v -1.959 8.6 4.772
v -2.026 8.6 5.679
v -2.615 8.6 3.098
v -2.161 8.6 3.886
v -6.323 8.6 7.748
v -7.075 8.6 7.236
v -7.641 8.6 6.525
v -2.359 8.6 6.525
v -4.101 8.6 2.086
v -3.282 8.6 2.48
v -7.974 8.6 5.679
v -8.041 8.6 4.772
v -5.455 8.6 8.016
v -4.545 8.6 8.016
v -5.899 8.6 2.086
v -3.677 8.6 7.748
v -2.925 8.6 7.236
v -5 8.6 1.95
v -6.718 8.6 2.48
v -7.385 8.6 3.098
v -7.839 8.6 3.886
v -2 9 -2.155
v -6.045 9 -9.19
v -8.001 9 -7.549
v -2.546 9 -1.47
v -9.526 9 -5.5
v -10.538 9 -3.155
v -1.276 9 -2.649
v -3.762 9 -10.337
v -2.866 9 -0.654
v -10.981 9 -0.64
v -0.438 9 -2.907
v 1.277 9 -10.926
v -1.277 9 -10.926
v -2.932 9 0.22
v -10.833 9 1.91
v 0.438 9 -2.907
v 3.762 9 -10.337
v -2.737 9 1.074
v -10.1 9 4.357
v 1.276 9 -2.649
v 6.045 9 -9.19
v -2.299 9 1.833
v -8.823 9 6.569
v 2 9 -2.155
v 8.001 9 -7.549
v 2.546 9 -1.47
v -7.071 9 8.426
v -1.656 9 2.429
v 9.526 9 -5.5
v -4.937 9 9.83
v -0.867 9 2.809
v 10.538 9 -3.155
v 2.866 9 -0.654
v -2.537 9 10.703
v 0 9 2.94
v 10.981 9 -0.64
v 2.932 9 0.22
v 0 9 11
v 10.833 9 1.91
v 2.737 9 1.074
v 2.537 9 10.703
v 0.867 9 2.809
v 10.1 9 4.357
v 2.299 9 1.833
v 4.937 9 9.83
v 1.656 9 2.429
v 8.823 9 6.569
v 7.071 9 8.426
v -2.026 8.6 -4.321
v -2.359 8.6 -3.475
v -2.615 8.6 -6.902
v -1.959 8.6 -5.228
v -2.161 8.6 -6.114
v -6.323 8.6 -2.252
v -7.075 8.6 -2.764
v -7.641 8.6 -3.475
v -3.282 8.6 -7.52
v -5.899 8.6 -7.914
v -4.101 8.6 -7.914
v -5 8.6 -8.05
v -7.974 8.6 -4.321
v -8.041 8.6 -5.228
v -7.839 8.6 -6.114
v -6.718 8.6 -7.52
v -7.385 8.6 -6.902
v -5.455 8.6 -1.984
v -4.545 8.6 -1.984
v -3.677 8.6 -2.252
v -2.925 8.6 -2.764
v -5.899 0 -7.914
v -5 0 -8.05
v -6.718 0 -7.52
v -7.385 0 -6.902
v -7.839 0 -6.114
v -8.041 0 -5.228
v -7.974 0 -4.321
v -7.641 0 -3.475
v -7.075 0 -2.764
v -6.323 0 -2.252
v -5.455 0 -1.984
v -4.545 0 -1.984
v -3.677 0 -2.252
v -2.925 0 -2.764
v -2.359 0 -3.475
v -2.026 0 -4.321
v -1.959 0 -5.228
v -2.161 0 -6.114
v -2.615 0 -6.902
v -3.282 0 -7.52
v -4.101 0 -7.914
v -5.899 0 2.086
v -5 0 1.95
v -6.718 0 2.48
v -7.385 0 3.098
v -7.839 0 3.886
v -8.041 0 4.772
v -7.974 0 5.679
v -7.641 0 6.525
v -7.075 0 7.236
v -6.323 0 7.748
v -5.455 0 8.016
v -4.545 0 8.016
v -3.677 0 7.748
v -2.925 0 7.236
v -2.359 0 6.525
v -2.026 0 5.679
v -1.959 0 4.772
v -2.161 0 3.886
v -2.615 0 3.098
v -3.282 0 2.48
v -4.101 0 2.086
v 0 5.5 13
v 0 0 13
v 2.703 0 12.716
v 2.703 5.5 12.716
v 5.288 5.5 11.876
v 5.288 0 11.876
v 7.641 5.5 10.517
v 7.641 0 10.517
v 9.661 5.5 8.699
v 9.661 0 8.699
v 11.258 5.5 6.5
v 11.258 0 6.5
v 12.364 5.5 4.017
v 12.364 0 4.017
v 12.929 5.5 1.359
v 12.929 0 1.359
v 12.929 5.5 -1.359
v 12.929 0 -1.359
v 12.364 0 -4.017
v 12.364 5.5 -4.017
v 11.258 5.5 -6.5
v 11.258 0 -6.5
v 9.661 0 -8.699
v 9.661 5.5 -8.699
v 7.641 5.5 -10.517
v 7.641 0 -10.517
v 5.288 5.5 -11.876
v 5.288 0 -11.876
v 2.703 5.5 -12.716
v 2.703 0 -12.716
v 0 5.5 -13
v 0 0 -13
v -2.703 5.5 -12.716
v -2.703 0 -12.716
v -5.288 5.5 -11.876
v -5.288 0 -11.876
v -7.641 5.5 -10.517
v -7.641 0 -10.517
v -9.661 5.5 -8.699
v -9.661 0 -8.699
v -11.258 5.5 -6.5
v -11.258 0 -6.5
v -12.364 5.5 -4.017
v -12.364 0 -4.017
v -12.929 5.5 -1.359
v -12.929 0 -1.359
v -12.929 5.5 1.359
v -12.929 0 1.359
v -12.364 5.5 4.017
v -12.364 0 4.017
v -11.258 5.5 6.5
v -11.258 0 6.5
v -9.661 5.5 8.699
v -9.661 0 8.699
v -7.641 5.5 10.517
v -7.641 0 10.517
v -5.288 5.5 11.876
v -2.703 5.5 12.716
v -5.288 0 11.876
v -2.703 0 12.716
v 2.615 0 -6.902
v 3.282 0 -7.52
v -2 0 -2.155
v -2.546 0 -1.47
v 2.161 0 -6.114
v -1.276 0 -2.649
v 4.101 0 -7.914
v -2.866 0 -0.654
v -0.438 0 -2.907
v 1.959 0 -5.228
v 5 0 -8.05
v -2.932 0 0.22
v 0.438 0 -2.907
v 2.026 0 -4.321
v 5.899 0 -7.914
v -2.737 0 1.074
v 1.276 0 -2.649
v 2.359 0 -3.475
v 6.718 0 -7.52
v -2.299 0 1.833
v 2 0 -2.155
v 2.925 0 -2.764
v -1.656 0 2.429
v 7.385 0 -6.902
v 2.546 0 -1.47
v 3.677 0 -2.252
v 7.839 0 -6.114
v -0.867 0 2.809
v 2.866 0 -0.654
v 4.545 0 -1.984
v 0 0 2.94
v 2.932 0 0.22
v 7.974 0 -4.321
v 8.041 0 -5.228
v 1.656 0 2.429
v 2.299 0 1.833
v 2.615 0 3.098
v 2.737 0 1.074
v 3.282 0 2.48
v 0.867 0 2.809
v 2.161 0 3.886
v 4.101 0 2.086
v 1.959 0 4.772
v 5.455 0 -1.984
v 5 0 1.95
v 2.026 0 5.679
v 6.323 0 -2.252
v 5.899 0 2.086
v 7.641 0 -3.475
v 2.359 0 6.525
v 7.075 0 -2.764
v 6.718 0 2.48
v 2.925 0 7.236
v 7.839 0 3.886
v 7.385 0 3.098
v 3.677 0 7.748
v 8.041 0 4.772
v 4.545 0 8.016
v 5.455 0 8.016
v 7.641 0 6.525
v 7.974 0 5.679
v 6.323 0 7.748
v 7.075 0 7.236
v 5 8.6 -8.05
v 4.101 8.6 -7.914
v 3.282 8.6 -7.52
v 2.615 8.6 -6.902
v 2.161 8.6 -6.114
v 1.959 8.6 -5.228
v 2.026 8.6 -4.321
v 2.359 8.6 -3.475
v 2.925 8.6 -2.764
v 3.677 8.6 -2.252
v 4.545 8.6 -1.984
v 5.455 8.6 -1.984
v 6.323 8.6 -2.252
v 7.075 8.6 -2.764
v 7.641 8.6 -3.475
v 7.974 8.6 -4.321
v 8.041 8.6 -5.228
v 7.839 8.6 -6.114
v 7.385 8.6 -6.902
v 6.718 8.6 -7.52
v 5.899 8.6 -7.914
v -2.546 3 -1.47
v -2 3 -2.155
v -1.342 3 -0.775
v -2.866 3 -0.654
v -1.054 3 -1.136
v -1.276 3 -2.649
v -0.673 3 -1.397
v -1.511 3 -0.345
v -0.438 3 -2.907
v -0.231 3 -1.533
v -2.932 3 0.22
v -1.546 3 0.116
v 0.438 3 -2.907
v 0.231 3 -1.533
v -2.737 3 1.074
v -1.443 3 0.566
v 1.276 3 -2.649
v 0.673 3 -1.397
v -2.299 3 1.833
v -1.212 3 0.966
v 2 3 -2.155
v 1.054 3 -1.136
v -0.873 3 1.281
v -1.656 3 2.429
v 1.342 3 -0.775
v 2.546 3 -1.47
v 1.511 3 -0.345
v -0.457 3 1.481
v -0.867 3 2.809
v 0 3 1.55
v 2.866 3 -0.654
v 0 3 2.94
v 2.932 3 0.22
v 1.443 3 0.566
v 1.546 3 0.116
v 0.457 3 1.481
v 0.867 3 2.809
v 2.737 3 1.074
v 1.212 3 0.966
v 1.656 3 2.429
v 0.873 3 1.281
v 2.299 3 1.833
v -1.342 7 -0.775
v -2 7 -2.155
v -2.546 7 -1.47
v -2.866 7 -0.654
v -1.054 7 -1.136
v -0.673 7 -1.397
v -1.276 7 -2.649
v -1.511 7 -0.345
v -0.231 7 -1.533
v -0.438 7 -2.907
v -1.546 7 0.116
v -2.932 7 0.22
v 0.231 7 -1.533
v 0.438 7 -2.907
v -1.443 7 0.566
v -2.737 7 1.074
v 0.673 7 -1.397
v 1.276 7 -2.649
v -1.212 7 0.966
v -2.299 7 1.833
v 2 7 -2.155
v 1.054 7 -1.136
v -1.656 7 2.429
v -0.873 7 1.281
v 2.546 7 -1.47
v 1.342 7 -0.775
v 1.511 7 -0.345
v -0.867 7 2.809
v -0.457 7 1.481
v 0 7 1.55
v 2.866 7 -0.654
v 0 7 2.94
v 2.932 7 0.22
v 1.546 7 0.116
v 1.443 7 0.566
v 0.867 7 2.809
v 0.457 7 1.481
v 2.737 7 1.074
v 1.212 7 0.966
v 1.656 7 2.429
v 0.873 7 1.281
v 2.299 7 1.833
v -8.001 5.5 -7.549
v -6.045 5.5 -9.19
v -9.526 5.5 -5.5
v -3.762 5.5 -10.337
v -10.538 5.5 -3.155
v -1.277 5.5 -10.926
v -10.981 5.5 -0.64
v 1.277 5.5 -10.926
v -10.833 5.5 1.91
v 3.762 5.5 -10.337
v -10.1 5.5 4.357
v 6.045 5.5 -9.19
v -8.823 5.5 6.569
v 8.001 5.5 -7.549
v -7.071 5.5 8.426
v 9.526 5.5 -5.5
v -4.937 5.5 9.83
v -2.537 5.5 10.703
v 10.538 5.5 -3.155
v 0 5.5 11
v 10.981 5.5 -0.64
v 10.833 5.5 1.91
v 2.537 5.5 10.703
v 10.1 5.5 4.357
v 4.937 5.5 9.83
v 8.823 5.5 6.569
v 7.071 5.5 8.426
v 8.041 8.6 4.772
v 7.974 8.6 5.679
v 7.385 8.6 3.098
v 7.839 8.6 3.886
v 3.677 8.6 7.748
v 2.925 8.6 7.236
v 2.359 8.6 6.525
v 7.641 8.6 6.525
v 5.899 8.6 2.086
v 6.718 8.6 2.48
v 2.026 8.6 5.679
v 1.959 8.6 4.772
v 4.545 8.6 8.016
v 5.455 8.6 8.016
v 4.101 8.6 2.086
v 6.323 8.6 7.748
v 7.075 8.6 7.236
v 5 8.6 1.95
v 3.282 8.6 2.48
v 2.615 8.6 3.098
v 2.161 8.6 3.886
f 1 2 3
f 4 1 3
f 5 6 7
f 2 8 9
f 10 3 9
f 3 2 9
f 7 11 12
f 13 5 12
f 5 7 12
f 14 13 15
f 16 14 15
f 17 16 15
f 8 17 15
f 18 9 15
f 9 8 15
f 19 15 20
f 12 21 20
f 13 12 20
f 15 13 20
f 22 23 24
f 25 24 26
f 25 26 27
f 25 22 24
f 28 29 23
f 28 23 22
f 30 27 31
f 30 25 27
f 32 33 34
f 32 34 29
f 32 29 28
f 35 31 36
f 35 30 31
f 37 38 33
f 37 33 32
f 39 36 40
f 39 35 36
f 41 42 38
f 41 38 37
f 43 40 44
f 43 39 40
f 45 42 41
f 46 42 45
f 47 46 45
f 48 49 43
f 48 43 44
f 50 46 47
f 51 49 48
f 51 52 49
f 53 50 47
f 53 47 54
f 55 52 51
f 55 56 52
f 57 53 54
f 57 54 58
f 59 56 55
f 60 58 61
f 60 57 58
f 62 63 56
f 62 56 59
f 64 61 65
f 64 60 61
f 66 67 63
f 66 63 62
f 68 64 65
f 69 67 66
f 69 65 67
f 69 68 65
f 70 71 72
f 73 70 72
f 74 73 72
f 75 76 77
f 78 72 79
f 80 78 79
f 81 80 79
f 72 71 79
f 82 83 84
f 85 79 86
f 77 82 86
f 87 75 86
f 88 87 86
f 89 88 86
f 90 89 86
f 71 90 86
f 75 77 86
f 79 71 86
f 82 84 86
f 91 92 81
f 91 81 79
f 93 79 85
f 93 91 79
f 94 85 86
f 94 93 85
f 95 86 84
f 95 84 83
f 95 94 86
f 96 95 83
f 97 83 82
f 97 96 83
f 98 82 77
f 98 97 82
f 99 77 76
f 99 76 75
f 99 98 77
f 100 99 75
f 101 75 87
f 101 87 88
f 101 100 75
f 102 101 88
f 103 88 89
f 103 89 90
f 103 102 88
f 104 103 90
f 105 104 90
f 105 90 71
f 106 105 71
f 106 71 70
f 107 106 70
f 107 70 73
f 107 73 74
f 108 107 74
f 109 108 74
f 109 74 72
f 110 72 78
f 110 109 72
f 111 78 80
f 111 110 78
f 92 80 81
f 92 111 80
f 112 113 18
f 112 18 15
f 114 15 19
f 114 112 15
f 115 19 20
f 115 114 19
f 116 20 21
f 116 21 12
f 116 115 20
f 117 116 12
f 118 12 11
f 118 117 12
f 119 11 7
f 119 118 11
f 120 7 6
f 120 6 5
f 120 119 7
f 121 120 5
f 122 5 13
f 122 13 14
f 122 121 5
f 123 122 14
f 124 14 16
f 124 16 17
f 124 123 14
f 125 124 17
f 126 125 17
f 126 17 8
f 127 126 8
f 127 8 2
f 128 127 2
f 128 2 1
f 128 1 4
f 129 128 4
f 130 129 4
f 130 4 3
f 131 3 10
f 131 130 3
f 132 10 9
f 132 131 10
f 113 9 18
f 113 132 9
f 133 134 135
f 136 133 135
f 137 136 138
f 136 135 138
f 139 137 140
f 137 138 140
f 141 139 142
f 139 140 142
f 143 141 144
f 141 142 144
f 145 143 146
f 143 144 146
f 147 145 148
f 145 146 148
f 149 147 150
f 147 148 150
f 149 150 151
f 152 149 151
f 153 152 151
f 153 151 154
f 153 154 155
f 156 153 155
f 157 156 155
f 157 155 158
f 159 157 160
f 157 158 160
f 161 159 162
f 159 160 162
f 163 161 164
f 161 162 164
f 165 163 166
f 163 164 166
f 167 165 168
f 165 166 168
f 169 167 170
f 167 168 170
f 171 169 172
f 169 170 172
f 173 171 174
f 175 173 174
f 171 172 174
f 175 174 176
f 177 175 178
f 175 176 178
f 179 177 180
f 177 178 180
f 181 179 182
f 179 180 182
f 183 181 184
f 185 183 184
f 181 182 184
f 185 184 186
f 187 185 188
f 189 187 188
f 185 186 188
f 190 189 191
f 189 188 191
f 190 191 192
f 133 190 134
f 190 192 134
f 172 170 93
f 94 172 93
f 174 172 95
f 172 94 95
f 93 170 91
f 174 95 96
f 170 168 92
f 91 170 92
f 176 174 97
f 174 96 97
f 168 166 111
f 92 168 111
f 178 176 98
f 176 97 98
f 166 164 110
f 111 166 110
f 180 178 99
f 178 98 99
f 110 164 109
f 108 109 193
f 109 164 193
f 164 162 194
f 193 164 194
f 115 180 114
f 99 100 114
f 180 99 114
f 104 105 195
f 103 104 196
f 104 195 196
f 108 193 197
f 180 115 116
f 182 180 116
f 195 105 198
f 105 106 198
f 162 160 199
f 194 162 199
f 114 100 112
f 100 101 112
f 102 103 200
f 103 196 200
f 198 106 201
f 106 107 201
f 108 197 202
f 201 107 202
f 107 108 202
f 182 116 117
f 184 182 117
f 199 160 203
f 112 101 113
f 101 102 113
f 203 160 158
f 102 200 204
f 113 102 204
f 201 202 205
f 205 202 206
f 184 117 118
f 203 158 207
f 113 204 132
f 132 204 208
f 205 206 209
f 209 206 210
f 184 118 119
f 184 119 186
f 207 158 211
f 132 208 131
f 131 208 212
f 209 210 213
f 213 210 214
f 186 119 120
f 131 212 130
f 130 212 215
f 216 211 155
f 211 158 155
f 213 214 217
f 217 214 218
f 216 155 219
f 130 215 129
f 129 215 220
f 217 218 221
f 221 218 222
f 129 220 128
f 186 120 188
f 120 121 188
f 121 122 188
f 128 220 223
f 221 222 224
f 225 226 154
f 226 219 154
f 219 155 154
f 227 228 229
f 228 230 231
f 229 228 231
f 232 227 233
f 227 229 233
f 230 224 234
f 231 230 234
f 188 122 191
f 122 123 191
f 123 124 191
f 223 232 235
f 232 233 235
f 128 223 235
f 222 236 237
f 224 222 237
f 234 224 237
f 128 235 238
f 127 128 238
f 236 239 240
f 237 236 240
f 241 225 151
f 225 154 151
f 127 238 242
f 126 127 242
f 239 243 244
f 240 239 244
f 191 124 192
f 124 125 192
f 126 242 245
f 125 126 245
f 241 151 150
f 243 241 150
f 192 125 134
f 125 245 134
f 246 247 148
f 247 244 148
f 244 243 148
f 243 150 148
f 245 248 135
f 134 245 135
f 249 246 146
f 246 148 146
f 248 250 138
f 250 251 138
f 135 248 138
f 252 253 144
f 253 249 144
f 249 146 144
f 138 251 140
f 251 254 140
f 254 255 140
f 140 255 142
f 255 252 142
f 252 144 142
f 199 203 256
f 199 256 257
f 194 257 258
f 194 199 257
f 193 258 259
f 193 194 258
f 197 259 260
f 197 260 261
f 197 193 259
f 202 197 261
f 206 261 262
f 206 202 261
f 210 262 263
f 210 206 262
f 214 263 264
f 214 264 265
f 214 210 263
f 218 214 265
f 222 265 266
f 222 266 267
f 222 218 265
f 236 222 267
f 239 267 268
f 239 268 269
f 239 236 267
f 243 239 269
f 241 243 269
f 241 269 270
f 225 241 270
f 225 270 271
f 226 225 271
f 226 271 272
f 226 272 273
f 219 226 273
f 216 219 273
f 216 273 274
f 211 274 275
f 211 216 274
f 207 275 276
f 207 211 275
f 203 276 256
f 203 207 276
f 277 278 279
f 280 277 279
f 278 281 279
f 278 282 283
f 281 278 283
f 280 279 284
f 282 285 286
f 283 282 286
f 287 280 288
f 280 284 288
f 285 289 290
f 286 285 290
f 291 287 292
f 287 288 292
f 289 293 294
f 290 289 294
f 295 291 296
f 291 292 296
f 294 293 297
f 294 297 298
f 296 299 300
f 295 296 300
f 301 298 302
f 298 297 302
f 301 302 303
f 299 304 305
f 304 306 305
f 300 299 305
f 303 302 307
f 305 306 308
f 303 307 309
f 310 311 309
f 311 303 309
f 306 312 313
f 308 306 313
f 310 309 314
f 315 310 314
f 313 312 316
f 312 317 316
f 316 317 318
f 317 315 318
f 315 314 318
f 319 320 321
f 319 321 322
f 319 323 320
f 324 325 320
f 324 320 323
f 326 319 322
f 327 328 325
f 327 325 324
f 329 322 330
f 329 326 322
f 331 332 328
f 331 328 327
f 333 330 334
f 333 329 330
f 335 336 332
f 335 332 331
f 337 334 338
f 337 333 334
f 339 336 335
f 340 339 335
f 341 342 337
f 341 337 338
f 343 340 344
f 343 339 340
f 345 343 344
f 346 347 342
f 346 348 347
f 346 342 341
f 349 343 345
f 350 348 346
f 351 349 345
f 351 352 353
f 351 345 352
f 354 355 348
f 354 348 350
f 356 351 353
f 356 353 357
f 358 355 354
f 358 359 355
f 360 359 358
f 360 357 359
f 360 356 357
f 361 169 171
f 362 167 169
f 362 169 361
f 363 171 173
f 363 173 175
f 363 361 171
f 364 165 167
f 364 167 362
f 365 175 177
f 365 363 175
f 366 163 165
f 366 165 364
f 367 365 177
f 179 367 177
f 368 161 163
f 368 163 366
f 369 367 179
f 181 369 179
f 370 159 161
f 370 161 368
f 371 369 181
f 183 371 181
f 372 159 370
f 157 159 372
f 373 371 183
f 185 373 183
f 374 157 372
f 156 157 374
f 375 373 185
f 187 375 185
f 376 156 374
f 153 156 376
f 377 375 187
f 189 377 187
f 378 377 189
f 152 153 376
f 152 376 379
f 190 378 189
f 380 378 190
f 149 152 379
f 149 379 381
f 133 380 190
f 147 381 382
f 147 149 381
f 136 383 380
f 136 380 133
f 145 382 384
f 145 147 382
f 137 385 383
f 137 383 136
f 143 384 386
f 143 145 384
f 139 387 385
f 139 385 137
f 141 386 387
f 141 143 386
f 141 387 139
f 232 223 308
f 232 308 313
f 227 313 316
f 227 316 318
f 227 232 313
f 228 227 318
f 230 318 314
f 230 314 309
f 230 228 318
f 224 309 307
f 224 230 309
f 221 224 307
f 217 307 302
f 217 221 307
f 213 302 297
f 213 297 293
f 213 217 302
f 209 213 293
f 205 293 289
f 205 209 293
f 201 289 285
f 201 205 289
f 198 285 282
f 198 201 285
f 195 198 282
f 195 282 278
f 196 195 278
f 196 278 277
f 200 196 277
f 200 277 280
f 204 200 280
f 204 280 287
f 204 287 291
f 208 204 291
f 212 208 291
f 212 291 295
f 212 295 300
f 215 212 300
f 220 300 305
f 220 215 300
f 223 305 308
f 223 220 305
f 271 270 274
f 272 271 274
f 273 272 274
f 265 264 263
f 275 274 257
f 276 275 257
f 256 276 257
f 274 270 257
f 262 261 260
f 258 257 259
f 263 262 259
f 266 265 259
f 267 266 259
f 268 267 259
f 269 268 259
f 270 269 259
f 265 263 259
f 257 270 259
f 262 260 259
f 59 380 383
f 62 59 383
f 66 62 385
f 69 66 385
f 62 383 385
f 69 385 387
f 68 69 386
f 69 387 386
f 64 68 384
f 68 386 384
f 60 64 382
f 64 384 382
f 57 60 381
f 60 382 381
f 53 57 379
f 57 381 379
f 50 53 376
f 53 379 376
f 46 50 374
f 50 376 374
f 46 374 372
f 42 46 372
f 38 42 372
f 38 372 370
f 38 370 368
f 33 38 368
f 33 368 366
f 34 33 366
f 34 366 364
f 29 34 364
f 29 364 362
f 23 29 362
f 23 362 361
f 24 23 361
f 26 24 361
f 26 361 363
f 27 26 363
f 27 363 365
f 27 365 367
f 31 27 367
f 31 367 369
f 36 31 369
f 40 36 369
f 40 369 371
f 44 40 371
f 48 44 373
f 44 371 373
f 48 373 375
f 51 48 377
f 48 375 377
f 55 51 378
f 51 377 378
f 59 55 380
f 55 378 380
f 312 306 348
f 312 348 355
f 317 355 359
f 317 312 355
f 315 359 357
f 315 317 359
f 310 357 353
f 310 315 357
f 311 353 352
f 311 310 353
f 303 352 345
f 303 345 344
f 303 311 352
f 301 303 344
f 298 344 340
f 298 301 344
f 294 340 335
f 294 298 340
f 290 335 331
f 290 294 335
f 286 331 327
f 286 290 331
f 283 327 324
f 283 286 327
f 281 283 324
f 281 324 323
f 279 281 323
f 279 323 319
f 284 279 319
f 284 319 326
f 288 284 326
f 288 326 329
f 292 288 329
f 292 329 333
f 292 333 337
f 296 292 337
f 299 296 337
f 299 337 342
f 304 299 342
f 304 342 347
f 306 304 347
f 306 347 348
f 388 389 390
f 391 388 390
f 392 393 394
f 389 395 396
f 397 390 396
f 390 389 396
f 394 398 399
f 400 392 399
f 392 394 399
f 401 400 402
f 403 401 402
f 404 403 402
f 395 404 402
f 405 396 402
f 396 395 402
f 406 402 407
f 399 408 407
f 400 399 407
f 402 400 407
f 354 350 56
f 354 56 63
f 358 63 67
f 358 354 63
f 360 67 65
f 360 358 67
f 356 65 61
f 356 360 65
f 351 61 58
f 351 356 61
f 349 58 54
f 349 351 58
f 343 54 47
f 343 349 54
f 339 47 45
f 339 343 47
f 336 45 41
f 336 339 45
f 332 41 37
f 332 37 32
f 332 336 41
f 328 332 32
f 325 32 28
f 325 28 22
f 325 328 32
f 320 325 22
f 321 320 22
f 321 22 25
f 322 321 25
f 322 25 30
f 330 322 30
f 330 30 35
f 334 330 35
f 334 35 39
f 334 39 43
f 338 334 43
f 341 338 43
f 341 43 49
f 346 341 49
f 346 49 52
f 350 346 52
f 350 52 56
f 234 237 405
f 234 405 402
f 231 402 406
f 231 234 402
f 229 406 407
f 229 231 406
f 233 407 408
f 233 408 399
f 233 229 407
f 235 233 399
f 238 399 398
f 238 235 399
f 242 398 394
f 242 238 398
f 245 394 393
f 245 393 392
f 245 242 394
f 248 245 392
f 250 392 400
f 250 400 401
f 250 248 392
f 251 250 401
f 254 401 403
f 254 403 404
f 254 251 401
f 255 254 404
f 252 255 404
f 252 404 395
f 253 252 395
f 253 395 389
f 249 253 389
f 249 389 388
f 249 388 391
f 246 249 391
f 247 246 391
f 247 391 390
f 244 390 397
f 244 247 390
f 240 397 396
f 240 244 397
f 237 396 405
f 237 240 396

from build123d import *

# Parameters (mm, degrees)
SKETCH2_R           = 11
SKETCH2_R_2         = 2.94
BOSS_EXTRUDE1_DEPTH = 9
SKETCH2_3_R         = 2.94
SKETCH2_3_R_2       = 1.55
BOSS_EXTRUDE2_DEPTH = 7
SKETCH2_4_R         = 2.94
SKETCH2_4_R_2       = 1.55
CUT_EXTRUDE1_DEPTH  = 3
SKETCH2_6_R         = 3.05
CUT_EXTRUDE2_DEPTH  = 8.6
SKETCH2_7_R         = 13
SKETCH2_7_R_2       = 11
BOSS_EXTRUDE3_DEPTH = 5.5


with BuildPart() as part:
    # Sketch2 → Boss-Extrude1 (new body)
    with BuildSketch(Plane(origin=(0, 0, 0), x_dir=(1, 0, 0), z_dir=(0, 1, 0))):
        with Locations(Location((0, 0, 0), (0, 0, 270))):
            Circle(SKETCH2_R)
        with Locations(Location((0, 0, 0), (0, 0, 270))):
            Circle(SKETCH2_R_2, mode=Mode.SUBTRACT)
    extrude(amount=BOSS_EXTRUDE1_DEPTH)

    # Sketch2<3> → Boss-Extrude2 (add)
    with BuildSketch(Plane(origin=(0, 0, 0), x_dir=(1, 0, 0), z_dir=(0, 1, 0))):
        with Locations(Location((0, 0, 0), (0, 0, 270))):
            Circle(SKETCH2_3_R)
        with Locations(Location((0, 0, 0), (0, 0, 270))):
            Circle(SKETCH2_3_R_2, mode=Mode.SUBTRACT)
    extrude(amount=BOSS_EXTRUDE2_DEPTH)

    # Sketch2<4> → Cut-Extrude1 (cut)
    with BuildSketch(Plane(origin=(0, 0, 0), x_dir=(1, 0, 0), z_dir=(0, 1, 0))):
        with Locations(Location((0, 0, 0), (0, 0, 270))):
            Circle(SKETCH2_4_R)
        with Locations(Location((0, 0, 0), (0, 0, 270))):
            Circle(SKETCH2_4_R_2, mode=Mode.SUBTRACT)
    extrude(amount=CUT_EXTRUDE1_DEPTH, mode=Mode.SUBTRACT)

    # Sketch2<6> → Cut-Extrude2 (cut)
    with BuildSketch(Plane(origin=(0, 0, 0), x_dir=(1, 0, 0), z_dir=(0, 1, 0))):
        with Locations(Location((5, 5, 0), (0, 0, 90))):
            Circle(SKETCH2_6_R)
        with Locations(Location((5, -5, 0), (0, 0, 90))):
            Circle(SKETCH2_6_R)
        with Locations(Location((-5, -5, 0), (0, 0, 90))):
            Circle(SKETCH2_6_R)
        with Locations(Location((-5, 5, 0), (0, 0, 90))):
            Circle(SKETCH2_6_R)
    extrude(amount=CUT_EXTRUDE2_DEPTH, mode=Mode.SUBTRACT)

    # Sketch2<7> → Boss-Extrude3 (add)
    with BuildSketch(Plane(origin=(0, 0, 0), x_dir=(1, 0, 0), z_dir=(0, 1, 0))):
        with Locations(Location((0, 0, 0), (0, 0, 270))):
            Circle(SKETCH2_7_R)
        with Locations(Location((0, 0, 0), (0, 0, 270))):
            Circle(SKETCH2_7_R_2, mode=Mode.SUBTRACT)
    extrude(amount=BOSS_EXTRUDE3_DEPTH)


solid = part.part
